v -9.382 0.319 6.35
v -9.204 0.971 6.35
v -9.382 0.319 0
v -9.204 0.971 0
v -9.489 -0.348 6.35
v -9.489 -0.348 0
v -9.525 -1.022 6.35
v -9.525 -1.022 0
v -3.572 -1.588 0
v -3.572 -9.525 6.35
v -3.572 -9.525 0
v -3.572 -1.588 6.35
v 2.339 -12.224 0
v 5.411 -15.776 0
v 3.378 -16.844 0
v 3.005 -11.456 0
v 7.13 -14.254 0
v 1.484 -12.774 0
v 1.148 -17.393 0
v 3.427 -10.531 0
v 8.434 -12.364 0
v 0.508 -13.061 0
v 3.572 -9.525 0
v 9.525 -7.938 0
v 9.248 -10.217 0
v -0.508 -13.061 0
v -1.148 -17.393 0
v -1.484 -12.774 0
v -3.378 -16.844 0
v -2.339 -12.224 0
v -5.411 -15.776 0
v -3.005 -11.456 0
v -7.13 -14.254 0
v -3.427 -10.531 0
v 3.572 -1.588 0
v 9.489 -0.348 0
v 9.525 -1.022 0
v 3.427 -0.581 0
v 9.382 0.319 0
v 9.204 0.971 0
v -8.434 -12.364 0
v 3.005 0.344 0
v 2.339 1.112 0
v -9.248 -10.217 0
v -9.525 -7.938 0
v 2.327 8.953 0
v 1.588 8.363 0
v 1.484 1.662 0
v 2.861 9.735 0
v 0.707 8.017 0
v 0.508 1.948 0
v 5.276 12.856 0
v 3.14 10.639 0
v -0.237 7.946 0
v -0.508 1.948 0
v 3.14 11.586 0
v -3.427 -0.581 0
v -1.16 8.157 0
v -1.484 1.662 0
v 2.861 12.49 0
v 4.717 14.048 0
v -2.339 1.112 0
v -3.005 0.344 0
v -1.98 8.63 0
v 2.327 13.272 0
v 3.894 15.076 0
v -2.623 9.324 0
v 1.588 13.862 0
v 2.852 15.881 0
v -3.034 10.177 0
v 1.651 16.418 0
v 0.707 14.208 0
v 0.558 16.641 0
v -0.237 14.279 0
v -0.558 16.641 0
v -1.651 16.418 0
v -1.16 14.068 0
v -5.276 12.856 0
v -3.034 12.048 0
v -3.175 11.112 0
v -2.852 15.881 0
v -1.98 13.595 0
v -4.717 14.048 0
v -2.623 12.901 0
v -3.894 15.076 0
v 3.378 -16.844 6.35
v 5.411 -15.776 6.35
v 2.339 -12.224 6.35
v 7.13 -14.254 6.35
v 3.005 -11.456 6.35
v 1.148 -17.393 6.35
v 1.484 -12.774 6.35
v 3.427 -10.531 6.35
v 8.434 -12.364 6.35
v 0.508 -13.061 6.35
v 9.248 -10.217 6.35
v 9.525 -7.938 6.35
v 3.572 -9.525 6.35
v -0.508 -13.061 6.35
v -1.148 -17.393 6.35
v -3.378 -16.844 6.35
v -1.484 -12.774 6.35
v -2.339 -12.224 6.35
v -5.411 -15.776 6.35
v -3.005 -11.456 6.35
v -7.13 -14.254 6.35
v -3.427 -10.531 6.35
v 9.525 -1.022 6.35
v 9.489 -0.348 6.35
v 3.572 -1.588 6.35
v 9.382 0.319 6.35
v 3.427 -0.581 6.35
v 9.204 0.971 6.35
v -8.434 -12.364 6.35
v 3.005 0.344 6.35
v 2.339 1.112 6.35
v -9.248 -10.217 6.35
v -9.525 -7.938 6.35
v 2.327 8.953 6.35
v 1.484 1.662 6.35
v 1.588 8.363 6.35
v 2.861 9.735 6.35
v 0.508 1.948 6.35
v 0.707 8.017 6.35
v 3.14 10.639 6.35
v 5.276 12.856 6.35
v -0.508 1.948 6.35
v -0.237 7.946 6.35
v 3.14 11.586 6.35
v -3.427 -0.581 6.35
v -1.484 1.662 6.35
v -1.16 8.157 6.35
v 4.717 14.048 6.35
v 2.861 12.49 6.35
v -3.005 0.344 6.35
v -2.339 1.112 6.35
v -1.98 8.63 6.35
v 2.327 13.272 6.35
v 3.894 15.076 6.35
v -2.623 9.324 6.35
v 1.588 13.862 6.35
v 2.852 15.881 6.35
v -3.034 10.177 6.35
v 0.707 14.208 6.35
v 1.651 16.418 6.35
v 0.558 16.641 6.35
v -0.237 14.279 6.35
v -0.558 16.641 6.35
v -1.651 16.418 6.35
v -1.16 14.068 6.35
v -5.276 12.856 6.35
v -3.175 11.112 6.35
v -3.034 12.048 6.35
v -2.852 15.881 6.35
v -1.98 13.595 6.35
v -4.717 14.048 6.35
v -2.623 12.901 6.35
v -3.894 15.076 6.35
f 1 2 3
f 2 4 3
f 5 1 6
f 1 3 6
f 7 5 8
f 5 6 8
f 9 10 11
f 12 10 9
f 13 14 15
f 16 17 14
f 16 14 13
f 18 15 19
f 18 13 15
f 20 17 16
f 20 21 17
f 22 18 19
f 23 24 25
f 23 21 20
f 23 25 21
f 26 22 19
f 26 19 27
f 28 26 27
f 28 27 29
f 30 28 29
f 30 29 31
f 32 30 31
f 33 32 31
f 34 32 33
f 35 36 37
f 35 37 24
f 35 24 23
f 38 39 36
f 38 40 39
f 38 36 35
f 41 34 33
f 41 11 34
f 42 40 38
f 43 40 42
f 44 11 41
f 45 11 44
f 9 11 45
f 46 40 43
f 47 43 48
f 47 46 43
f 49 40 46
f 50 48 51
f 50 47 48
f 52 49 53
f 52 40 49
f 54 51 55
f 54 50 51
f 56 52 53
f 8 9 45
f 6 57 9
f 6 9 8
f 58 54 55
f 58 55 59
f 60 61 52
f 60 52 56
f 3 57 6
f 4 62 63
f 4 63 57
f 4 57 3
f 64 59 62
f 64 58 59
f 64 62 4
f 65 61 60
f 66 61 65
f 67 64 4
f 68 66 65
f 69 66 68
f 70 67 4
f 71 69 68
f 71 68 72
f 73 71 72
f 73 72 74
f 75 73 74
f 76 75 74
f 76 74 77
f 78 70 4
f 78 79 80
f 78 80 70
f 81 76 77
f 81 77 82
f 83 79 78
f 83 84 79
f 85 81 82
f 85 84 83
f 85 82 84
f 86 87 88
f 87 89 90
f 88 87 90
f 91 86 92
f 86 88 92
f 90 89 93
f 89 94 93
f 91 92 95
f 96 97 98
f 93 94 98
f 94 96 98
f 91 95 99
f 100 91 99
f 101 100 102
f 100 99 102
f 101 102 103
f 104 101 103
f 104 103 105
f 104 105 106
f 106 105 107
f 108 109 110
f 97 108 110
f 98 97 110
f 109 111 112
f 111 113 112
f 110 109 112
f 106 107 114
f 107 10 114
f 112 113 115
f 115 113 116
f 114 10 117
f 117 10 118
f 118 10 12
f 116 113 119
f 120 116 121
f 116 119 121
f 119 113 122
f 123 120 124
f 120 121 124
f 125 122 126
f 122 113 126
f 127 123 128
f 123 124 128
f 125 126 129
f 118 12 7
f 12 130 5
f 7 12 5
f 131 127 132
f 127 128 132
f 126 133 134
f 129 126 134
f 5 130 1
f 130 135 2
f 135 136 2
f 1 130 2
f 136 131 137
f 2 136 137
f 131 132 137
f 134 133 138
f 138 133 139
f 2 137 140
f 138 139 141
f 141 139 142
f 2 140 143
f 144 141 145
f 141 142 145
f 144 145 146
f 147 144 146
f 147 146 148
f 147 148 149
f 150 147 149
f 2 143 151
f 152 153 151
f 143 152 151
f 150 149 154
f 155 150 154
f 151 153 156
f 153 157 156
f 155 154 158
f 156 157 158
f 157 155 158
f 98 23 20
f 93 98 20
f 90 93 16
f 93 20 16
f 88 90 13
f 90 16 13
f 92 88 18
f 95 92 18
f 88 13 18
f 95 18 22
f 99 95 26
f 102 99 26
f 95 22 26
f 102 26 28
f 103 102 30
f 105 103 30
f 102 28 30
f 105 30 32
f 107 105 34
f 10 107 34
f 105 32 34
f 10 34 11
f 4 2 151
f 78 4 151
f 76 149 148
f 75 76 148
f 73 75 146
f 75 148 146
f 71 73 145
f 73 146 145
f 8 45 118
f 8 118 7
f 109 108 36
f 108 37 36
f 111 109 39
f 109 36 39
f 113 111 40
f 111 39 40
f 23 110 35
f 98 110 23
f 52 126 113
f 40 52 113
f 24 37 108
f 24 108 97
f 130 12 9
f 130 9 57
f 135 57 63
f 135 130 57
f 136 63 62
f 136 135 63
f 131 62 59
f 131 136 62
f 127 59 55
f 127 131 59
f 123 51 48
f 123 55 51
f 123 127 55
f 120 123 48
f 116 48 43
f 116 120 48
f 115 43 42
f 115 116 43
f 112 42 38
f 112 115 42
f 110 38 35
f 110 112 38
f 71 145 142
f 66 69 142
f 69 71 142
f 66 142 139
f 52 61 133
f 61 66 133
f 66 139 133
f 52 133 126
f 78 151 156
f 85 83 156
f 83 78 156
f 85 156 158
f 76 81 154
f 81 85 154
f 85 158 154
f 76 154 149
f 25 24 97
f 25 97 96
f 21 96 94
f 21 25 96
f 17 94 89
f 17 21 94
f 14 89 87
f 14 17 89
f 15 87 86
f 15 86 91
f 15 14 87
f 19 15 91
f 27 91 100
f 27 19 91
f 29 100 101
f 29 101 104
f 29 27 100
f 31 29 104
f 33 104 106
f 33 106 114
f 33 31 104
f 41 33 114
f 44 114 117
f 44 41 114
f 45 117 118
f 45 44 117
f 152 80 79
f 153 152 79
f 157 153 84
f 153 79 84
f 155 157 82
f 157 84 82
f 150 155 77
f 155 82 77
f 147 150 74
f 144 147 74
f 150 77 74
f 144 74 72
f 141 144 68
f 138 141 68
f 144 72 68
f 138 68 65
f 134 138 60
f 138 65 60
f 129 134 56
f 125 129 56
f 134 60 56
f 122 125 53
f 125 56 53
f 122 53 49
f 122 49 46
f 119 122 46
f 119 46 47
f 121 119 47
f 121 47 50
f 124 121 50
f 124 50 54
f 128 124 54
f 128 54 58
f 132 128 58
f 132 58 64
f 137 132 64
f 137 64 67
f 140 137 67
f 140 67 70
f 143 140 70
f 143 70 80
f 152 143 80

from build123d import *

# Parameters (mm, degrees)
BASE_FLANGE1_DEPTH              = 6.35
F_1_4_0_25_DIAMETER_HOLE1_D     = 6.35
F_9_32_0_28125_DIAMETER_HOLE1_D = 7.14375
CUT_EXTRUDE1_REACH              = 22.88
CUT_EXTRUDE2_DEPTH              = 21.88030247
FILLET1_R                       = 6.35


# Sheet-metal steps are written as plain solids
with BuildPart() as part:
    # Sketch1 → Base-Flange1 (new body)
    with BuildSketch(Plane.XY):
        with BuildLine():
            Line((9.525, 7.9375), (9.525, -7.9375))
            ThreePointArc((9.525, -7.9375), (0, -17.4625), (-9.525, -7.9375))
            Line((-9.525, -7.9375), (-9.525, 7.9375))
            ThreePointArc((-9.525, 7.9375), (0, 17.4625), (9.525, 7.9375))
        make_face()
    extrude(amount=BASE_FLANGE1_DEPTH)

    # 1/4 (0.25) Diameter Hole1 (through all)
    with Locations(Plane.XY.offset(6.35)):
        with Locations((0, 11.1125)):
            Hole(F_1_4_0_25_DIAMETER_HOLE1_D / 2)

    # 9/32 (0.28125) Diameter Hole1 (through all)
    with Locations(Plane.XY.offset(6.35)):
        with Locations((0, -9.525)):
            Hole(F_9_32_0_28125_DIAMETER_HOLE1_D / 2)

    # Sketch6 → Cut-Extrude1 (cut, up to next)
    with BuildSketch(Plane.XY.offset(6.35), mode=Mode.PRIVATE) as cut_extrude1_sk1:
        with BuildLine():
            Line((-3.571875, -9.525), (-3.571875, -1.5875))
            ThreePointArc((-3.571875, -1.5875), (0, 1.984375), (3.571875, -1.5875))
            Line((3.571875, -1.5875), (3.571875, -9.525))
            ThreePointArc((3.571875, -9.525), (0, -13.096875), (-3.571875, -9.525))
        make_face()
    cut_extrude1_tool1 = extrude(cut_extrude1_sk1.sketch, amount=-CUT_EXTRUDE1_REACH, mode=Mode.PRIVATE) & part.part
    add(cut_extrude1_tool1.solids().sort_by_distance((0, -5.55625, 6.35))[0], mode=Mode.SUBTRACT)

    # Sketch7 → Cut-Extrude2 (cut, through all)
    with BuildSketch(Plane.XY.offset(6.35)):
        with BuildLine():
            Line((-4.336848919, 16.417910748), (-9.525, 0))
            Line((-9.525, 0), (-5.27553043, 12.856258225))
            ThreePointArc((-5.27553043, 12.856258225), (-3.89412581, 15.075793862), (-1.650615296, 16.417910748))
            Line((-1.650615296, 16.417910748), (-4.336848919, 16.417910748))
        make_face()
        with BuildLine():
            ThreePointArc((1.650615296, 16.417910748), (3.89412581, 15.075793862), (5.27553043, 12.856258225))
            Line((5.27553043, 12.856258225), (9.525, 0))
            Line((9.525, 0), (4.336848919, 16.417910748))
            Line((4.336848919, 16.417910748), (1.650615296, 16.417910748))
        make_face()
        with BuildLine():
            ThreePointArc((9.525, 7.9375), (8.125088029, 12.908271522), (4.336848919, 16.417910748))
            Line((4.336848919, 16.417910748), (9.525, 0))
            Line((9.525, 0), (9.525, 7.9375))
        make_face()
        with BuildLine():
            Line((-9.525, 7.9375), (-9.525, 0))
            Line((-9.525, 0), (-4.336848919, 16.417910748))
            ThreePointArc((-4.336848919, 16.417910748), (-8.125088029, 12.908271522), (-9.525, 7.9375))
        make_face()
        with BuildLine():
            ThreePointArc((-1e-09, 17.4625), (-2.230438592, 17.197671094), (-4.336848919, 16.417910748))
            Line((-4.336848919, 16.417910748), (-1.650615296, 16.417910748))
            ThreePointArc((-1.650615296, 16.417910748), (0, 16.66875), (1.650615296, 16.417910748))
            Line((1.650615296, 16.417910748), (4.336848919, 16.417910748))
            ThreePointArc((4.336848919, 16.417910748), (2.230438592, 17.197671094), (-1e-09, 17.4625))
        make_face()
    extrude(amount=-CUT_EXTRUDE2_DEPTH, mode=Mode.SUBTRACT)

    # Fillet1
    fillet1_edges = [part.edges().sort_by_distance(p)[0] for p in [
        (9.525, 0, 3.175),
        (-9.525, 0, 3.175),
    ]]
    fillet(fillet1_edges, radius=FILLET1_R)


solid = part.part
